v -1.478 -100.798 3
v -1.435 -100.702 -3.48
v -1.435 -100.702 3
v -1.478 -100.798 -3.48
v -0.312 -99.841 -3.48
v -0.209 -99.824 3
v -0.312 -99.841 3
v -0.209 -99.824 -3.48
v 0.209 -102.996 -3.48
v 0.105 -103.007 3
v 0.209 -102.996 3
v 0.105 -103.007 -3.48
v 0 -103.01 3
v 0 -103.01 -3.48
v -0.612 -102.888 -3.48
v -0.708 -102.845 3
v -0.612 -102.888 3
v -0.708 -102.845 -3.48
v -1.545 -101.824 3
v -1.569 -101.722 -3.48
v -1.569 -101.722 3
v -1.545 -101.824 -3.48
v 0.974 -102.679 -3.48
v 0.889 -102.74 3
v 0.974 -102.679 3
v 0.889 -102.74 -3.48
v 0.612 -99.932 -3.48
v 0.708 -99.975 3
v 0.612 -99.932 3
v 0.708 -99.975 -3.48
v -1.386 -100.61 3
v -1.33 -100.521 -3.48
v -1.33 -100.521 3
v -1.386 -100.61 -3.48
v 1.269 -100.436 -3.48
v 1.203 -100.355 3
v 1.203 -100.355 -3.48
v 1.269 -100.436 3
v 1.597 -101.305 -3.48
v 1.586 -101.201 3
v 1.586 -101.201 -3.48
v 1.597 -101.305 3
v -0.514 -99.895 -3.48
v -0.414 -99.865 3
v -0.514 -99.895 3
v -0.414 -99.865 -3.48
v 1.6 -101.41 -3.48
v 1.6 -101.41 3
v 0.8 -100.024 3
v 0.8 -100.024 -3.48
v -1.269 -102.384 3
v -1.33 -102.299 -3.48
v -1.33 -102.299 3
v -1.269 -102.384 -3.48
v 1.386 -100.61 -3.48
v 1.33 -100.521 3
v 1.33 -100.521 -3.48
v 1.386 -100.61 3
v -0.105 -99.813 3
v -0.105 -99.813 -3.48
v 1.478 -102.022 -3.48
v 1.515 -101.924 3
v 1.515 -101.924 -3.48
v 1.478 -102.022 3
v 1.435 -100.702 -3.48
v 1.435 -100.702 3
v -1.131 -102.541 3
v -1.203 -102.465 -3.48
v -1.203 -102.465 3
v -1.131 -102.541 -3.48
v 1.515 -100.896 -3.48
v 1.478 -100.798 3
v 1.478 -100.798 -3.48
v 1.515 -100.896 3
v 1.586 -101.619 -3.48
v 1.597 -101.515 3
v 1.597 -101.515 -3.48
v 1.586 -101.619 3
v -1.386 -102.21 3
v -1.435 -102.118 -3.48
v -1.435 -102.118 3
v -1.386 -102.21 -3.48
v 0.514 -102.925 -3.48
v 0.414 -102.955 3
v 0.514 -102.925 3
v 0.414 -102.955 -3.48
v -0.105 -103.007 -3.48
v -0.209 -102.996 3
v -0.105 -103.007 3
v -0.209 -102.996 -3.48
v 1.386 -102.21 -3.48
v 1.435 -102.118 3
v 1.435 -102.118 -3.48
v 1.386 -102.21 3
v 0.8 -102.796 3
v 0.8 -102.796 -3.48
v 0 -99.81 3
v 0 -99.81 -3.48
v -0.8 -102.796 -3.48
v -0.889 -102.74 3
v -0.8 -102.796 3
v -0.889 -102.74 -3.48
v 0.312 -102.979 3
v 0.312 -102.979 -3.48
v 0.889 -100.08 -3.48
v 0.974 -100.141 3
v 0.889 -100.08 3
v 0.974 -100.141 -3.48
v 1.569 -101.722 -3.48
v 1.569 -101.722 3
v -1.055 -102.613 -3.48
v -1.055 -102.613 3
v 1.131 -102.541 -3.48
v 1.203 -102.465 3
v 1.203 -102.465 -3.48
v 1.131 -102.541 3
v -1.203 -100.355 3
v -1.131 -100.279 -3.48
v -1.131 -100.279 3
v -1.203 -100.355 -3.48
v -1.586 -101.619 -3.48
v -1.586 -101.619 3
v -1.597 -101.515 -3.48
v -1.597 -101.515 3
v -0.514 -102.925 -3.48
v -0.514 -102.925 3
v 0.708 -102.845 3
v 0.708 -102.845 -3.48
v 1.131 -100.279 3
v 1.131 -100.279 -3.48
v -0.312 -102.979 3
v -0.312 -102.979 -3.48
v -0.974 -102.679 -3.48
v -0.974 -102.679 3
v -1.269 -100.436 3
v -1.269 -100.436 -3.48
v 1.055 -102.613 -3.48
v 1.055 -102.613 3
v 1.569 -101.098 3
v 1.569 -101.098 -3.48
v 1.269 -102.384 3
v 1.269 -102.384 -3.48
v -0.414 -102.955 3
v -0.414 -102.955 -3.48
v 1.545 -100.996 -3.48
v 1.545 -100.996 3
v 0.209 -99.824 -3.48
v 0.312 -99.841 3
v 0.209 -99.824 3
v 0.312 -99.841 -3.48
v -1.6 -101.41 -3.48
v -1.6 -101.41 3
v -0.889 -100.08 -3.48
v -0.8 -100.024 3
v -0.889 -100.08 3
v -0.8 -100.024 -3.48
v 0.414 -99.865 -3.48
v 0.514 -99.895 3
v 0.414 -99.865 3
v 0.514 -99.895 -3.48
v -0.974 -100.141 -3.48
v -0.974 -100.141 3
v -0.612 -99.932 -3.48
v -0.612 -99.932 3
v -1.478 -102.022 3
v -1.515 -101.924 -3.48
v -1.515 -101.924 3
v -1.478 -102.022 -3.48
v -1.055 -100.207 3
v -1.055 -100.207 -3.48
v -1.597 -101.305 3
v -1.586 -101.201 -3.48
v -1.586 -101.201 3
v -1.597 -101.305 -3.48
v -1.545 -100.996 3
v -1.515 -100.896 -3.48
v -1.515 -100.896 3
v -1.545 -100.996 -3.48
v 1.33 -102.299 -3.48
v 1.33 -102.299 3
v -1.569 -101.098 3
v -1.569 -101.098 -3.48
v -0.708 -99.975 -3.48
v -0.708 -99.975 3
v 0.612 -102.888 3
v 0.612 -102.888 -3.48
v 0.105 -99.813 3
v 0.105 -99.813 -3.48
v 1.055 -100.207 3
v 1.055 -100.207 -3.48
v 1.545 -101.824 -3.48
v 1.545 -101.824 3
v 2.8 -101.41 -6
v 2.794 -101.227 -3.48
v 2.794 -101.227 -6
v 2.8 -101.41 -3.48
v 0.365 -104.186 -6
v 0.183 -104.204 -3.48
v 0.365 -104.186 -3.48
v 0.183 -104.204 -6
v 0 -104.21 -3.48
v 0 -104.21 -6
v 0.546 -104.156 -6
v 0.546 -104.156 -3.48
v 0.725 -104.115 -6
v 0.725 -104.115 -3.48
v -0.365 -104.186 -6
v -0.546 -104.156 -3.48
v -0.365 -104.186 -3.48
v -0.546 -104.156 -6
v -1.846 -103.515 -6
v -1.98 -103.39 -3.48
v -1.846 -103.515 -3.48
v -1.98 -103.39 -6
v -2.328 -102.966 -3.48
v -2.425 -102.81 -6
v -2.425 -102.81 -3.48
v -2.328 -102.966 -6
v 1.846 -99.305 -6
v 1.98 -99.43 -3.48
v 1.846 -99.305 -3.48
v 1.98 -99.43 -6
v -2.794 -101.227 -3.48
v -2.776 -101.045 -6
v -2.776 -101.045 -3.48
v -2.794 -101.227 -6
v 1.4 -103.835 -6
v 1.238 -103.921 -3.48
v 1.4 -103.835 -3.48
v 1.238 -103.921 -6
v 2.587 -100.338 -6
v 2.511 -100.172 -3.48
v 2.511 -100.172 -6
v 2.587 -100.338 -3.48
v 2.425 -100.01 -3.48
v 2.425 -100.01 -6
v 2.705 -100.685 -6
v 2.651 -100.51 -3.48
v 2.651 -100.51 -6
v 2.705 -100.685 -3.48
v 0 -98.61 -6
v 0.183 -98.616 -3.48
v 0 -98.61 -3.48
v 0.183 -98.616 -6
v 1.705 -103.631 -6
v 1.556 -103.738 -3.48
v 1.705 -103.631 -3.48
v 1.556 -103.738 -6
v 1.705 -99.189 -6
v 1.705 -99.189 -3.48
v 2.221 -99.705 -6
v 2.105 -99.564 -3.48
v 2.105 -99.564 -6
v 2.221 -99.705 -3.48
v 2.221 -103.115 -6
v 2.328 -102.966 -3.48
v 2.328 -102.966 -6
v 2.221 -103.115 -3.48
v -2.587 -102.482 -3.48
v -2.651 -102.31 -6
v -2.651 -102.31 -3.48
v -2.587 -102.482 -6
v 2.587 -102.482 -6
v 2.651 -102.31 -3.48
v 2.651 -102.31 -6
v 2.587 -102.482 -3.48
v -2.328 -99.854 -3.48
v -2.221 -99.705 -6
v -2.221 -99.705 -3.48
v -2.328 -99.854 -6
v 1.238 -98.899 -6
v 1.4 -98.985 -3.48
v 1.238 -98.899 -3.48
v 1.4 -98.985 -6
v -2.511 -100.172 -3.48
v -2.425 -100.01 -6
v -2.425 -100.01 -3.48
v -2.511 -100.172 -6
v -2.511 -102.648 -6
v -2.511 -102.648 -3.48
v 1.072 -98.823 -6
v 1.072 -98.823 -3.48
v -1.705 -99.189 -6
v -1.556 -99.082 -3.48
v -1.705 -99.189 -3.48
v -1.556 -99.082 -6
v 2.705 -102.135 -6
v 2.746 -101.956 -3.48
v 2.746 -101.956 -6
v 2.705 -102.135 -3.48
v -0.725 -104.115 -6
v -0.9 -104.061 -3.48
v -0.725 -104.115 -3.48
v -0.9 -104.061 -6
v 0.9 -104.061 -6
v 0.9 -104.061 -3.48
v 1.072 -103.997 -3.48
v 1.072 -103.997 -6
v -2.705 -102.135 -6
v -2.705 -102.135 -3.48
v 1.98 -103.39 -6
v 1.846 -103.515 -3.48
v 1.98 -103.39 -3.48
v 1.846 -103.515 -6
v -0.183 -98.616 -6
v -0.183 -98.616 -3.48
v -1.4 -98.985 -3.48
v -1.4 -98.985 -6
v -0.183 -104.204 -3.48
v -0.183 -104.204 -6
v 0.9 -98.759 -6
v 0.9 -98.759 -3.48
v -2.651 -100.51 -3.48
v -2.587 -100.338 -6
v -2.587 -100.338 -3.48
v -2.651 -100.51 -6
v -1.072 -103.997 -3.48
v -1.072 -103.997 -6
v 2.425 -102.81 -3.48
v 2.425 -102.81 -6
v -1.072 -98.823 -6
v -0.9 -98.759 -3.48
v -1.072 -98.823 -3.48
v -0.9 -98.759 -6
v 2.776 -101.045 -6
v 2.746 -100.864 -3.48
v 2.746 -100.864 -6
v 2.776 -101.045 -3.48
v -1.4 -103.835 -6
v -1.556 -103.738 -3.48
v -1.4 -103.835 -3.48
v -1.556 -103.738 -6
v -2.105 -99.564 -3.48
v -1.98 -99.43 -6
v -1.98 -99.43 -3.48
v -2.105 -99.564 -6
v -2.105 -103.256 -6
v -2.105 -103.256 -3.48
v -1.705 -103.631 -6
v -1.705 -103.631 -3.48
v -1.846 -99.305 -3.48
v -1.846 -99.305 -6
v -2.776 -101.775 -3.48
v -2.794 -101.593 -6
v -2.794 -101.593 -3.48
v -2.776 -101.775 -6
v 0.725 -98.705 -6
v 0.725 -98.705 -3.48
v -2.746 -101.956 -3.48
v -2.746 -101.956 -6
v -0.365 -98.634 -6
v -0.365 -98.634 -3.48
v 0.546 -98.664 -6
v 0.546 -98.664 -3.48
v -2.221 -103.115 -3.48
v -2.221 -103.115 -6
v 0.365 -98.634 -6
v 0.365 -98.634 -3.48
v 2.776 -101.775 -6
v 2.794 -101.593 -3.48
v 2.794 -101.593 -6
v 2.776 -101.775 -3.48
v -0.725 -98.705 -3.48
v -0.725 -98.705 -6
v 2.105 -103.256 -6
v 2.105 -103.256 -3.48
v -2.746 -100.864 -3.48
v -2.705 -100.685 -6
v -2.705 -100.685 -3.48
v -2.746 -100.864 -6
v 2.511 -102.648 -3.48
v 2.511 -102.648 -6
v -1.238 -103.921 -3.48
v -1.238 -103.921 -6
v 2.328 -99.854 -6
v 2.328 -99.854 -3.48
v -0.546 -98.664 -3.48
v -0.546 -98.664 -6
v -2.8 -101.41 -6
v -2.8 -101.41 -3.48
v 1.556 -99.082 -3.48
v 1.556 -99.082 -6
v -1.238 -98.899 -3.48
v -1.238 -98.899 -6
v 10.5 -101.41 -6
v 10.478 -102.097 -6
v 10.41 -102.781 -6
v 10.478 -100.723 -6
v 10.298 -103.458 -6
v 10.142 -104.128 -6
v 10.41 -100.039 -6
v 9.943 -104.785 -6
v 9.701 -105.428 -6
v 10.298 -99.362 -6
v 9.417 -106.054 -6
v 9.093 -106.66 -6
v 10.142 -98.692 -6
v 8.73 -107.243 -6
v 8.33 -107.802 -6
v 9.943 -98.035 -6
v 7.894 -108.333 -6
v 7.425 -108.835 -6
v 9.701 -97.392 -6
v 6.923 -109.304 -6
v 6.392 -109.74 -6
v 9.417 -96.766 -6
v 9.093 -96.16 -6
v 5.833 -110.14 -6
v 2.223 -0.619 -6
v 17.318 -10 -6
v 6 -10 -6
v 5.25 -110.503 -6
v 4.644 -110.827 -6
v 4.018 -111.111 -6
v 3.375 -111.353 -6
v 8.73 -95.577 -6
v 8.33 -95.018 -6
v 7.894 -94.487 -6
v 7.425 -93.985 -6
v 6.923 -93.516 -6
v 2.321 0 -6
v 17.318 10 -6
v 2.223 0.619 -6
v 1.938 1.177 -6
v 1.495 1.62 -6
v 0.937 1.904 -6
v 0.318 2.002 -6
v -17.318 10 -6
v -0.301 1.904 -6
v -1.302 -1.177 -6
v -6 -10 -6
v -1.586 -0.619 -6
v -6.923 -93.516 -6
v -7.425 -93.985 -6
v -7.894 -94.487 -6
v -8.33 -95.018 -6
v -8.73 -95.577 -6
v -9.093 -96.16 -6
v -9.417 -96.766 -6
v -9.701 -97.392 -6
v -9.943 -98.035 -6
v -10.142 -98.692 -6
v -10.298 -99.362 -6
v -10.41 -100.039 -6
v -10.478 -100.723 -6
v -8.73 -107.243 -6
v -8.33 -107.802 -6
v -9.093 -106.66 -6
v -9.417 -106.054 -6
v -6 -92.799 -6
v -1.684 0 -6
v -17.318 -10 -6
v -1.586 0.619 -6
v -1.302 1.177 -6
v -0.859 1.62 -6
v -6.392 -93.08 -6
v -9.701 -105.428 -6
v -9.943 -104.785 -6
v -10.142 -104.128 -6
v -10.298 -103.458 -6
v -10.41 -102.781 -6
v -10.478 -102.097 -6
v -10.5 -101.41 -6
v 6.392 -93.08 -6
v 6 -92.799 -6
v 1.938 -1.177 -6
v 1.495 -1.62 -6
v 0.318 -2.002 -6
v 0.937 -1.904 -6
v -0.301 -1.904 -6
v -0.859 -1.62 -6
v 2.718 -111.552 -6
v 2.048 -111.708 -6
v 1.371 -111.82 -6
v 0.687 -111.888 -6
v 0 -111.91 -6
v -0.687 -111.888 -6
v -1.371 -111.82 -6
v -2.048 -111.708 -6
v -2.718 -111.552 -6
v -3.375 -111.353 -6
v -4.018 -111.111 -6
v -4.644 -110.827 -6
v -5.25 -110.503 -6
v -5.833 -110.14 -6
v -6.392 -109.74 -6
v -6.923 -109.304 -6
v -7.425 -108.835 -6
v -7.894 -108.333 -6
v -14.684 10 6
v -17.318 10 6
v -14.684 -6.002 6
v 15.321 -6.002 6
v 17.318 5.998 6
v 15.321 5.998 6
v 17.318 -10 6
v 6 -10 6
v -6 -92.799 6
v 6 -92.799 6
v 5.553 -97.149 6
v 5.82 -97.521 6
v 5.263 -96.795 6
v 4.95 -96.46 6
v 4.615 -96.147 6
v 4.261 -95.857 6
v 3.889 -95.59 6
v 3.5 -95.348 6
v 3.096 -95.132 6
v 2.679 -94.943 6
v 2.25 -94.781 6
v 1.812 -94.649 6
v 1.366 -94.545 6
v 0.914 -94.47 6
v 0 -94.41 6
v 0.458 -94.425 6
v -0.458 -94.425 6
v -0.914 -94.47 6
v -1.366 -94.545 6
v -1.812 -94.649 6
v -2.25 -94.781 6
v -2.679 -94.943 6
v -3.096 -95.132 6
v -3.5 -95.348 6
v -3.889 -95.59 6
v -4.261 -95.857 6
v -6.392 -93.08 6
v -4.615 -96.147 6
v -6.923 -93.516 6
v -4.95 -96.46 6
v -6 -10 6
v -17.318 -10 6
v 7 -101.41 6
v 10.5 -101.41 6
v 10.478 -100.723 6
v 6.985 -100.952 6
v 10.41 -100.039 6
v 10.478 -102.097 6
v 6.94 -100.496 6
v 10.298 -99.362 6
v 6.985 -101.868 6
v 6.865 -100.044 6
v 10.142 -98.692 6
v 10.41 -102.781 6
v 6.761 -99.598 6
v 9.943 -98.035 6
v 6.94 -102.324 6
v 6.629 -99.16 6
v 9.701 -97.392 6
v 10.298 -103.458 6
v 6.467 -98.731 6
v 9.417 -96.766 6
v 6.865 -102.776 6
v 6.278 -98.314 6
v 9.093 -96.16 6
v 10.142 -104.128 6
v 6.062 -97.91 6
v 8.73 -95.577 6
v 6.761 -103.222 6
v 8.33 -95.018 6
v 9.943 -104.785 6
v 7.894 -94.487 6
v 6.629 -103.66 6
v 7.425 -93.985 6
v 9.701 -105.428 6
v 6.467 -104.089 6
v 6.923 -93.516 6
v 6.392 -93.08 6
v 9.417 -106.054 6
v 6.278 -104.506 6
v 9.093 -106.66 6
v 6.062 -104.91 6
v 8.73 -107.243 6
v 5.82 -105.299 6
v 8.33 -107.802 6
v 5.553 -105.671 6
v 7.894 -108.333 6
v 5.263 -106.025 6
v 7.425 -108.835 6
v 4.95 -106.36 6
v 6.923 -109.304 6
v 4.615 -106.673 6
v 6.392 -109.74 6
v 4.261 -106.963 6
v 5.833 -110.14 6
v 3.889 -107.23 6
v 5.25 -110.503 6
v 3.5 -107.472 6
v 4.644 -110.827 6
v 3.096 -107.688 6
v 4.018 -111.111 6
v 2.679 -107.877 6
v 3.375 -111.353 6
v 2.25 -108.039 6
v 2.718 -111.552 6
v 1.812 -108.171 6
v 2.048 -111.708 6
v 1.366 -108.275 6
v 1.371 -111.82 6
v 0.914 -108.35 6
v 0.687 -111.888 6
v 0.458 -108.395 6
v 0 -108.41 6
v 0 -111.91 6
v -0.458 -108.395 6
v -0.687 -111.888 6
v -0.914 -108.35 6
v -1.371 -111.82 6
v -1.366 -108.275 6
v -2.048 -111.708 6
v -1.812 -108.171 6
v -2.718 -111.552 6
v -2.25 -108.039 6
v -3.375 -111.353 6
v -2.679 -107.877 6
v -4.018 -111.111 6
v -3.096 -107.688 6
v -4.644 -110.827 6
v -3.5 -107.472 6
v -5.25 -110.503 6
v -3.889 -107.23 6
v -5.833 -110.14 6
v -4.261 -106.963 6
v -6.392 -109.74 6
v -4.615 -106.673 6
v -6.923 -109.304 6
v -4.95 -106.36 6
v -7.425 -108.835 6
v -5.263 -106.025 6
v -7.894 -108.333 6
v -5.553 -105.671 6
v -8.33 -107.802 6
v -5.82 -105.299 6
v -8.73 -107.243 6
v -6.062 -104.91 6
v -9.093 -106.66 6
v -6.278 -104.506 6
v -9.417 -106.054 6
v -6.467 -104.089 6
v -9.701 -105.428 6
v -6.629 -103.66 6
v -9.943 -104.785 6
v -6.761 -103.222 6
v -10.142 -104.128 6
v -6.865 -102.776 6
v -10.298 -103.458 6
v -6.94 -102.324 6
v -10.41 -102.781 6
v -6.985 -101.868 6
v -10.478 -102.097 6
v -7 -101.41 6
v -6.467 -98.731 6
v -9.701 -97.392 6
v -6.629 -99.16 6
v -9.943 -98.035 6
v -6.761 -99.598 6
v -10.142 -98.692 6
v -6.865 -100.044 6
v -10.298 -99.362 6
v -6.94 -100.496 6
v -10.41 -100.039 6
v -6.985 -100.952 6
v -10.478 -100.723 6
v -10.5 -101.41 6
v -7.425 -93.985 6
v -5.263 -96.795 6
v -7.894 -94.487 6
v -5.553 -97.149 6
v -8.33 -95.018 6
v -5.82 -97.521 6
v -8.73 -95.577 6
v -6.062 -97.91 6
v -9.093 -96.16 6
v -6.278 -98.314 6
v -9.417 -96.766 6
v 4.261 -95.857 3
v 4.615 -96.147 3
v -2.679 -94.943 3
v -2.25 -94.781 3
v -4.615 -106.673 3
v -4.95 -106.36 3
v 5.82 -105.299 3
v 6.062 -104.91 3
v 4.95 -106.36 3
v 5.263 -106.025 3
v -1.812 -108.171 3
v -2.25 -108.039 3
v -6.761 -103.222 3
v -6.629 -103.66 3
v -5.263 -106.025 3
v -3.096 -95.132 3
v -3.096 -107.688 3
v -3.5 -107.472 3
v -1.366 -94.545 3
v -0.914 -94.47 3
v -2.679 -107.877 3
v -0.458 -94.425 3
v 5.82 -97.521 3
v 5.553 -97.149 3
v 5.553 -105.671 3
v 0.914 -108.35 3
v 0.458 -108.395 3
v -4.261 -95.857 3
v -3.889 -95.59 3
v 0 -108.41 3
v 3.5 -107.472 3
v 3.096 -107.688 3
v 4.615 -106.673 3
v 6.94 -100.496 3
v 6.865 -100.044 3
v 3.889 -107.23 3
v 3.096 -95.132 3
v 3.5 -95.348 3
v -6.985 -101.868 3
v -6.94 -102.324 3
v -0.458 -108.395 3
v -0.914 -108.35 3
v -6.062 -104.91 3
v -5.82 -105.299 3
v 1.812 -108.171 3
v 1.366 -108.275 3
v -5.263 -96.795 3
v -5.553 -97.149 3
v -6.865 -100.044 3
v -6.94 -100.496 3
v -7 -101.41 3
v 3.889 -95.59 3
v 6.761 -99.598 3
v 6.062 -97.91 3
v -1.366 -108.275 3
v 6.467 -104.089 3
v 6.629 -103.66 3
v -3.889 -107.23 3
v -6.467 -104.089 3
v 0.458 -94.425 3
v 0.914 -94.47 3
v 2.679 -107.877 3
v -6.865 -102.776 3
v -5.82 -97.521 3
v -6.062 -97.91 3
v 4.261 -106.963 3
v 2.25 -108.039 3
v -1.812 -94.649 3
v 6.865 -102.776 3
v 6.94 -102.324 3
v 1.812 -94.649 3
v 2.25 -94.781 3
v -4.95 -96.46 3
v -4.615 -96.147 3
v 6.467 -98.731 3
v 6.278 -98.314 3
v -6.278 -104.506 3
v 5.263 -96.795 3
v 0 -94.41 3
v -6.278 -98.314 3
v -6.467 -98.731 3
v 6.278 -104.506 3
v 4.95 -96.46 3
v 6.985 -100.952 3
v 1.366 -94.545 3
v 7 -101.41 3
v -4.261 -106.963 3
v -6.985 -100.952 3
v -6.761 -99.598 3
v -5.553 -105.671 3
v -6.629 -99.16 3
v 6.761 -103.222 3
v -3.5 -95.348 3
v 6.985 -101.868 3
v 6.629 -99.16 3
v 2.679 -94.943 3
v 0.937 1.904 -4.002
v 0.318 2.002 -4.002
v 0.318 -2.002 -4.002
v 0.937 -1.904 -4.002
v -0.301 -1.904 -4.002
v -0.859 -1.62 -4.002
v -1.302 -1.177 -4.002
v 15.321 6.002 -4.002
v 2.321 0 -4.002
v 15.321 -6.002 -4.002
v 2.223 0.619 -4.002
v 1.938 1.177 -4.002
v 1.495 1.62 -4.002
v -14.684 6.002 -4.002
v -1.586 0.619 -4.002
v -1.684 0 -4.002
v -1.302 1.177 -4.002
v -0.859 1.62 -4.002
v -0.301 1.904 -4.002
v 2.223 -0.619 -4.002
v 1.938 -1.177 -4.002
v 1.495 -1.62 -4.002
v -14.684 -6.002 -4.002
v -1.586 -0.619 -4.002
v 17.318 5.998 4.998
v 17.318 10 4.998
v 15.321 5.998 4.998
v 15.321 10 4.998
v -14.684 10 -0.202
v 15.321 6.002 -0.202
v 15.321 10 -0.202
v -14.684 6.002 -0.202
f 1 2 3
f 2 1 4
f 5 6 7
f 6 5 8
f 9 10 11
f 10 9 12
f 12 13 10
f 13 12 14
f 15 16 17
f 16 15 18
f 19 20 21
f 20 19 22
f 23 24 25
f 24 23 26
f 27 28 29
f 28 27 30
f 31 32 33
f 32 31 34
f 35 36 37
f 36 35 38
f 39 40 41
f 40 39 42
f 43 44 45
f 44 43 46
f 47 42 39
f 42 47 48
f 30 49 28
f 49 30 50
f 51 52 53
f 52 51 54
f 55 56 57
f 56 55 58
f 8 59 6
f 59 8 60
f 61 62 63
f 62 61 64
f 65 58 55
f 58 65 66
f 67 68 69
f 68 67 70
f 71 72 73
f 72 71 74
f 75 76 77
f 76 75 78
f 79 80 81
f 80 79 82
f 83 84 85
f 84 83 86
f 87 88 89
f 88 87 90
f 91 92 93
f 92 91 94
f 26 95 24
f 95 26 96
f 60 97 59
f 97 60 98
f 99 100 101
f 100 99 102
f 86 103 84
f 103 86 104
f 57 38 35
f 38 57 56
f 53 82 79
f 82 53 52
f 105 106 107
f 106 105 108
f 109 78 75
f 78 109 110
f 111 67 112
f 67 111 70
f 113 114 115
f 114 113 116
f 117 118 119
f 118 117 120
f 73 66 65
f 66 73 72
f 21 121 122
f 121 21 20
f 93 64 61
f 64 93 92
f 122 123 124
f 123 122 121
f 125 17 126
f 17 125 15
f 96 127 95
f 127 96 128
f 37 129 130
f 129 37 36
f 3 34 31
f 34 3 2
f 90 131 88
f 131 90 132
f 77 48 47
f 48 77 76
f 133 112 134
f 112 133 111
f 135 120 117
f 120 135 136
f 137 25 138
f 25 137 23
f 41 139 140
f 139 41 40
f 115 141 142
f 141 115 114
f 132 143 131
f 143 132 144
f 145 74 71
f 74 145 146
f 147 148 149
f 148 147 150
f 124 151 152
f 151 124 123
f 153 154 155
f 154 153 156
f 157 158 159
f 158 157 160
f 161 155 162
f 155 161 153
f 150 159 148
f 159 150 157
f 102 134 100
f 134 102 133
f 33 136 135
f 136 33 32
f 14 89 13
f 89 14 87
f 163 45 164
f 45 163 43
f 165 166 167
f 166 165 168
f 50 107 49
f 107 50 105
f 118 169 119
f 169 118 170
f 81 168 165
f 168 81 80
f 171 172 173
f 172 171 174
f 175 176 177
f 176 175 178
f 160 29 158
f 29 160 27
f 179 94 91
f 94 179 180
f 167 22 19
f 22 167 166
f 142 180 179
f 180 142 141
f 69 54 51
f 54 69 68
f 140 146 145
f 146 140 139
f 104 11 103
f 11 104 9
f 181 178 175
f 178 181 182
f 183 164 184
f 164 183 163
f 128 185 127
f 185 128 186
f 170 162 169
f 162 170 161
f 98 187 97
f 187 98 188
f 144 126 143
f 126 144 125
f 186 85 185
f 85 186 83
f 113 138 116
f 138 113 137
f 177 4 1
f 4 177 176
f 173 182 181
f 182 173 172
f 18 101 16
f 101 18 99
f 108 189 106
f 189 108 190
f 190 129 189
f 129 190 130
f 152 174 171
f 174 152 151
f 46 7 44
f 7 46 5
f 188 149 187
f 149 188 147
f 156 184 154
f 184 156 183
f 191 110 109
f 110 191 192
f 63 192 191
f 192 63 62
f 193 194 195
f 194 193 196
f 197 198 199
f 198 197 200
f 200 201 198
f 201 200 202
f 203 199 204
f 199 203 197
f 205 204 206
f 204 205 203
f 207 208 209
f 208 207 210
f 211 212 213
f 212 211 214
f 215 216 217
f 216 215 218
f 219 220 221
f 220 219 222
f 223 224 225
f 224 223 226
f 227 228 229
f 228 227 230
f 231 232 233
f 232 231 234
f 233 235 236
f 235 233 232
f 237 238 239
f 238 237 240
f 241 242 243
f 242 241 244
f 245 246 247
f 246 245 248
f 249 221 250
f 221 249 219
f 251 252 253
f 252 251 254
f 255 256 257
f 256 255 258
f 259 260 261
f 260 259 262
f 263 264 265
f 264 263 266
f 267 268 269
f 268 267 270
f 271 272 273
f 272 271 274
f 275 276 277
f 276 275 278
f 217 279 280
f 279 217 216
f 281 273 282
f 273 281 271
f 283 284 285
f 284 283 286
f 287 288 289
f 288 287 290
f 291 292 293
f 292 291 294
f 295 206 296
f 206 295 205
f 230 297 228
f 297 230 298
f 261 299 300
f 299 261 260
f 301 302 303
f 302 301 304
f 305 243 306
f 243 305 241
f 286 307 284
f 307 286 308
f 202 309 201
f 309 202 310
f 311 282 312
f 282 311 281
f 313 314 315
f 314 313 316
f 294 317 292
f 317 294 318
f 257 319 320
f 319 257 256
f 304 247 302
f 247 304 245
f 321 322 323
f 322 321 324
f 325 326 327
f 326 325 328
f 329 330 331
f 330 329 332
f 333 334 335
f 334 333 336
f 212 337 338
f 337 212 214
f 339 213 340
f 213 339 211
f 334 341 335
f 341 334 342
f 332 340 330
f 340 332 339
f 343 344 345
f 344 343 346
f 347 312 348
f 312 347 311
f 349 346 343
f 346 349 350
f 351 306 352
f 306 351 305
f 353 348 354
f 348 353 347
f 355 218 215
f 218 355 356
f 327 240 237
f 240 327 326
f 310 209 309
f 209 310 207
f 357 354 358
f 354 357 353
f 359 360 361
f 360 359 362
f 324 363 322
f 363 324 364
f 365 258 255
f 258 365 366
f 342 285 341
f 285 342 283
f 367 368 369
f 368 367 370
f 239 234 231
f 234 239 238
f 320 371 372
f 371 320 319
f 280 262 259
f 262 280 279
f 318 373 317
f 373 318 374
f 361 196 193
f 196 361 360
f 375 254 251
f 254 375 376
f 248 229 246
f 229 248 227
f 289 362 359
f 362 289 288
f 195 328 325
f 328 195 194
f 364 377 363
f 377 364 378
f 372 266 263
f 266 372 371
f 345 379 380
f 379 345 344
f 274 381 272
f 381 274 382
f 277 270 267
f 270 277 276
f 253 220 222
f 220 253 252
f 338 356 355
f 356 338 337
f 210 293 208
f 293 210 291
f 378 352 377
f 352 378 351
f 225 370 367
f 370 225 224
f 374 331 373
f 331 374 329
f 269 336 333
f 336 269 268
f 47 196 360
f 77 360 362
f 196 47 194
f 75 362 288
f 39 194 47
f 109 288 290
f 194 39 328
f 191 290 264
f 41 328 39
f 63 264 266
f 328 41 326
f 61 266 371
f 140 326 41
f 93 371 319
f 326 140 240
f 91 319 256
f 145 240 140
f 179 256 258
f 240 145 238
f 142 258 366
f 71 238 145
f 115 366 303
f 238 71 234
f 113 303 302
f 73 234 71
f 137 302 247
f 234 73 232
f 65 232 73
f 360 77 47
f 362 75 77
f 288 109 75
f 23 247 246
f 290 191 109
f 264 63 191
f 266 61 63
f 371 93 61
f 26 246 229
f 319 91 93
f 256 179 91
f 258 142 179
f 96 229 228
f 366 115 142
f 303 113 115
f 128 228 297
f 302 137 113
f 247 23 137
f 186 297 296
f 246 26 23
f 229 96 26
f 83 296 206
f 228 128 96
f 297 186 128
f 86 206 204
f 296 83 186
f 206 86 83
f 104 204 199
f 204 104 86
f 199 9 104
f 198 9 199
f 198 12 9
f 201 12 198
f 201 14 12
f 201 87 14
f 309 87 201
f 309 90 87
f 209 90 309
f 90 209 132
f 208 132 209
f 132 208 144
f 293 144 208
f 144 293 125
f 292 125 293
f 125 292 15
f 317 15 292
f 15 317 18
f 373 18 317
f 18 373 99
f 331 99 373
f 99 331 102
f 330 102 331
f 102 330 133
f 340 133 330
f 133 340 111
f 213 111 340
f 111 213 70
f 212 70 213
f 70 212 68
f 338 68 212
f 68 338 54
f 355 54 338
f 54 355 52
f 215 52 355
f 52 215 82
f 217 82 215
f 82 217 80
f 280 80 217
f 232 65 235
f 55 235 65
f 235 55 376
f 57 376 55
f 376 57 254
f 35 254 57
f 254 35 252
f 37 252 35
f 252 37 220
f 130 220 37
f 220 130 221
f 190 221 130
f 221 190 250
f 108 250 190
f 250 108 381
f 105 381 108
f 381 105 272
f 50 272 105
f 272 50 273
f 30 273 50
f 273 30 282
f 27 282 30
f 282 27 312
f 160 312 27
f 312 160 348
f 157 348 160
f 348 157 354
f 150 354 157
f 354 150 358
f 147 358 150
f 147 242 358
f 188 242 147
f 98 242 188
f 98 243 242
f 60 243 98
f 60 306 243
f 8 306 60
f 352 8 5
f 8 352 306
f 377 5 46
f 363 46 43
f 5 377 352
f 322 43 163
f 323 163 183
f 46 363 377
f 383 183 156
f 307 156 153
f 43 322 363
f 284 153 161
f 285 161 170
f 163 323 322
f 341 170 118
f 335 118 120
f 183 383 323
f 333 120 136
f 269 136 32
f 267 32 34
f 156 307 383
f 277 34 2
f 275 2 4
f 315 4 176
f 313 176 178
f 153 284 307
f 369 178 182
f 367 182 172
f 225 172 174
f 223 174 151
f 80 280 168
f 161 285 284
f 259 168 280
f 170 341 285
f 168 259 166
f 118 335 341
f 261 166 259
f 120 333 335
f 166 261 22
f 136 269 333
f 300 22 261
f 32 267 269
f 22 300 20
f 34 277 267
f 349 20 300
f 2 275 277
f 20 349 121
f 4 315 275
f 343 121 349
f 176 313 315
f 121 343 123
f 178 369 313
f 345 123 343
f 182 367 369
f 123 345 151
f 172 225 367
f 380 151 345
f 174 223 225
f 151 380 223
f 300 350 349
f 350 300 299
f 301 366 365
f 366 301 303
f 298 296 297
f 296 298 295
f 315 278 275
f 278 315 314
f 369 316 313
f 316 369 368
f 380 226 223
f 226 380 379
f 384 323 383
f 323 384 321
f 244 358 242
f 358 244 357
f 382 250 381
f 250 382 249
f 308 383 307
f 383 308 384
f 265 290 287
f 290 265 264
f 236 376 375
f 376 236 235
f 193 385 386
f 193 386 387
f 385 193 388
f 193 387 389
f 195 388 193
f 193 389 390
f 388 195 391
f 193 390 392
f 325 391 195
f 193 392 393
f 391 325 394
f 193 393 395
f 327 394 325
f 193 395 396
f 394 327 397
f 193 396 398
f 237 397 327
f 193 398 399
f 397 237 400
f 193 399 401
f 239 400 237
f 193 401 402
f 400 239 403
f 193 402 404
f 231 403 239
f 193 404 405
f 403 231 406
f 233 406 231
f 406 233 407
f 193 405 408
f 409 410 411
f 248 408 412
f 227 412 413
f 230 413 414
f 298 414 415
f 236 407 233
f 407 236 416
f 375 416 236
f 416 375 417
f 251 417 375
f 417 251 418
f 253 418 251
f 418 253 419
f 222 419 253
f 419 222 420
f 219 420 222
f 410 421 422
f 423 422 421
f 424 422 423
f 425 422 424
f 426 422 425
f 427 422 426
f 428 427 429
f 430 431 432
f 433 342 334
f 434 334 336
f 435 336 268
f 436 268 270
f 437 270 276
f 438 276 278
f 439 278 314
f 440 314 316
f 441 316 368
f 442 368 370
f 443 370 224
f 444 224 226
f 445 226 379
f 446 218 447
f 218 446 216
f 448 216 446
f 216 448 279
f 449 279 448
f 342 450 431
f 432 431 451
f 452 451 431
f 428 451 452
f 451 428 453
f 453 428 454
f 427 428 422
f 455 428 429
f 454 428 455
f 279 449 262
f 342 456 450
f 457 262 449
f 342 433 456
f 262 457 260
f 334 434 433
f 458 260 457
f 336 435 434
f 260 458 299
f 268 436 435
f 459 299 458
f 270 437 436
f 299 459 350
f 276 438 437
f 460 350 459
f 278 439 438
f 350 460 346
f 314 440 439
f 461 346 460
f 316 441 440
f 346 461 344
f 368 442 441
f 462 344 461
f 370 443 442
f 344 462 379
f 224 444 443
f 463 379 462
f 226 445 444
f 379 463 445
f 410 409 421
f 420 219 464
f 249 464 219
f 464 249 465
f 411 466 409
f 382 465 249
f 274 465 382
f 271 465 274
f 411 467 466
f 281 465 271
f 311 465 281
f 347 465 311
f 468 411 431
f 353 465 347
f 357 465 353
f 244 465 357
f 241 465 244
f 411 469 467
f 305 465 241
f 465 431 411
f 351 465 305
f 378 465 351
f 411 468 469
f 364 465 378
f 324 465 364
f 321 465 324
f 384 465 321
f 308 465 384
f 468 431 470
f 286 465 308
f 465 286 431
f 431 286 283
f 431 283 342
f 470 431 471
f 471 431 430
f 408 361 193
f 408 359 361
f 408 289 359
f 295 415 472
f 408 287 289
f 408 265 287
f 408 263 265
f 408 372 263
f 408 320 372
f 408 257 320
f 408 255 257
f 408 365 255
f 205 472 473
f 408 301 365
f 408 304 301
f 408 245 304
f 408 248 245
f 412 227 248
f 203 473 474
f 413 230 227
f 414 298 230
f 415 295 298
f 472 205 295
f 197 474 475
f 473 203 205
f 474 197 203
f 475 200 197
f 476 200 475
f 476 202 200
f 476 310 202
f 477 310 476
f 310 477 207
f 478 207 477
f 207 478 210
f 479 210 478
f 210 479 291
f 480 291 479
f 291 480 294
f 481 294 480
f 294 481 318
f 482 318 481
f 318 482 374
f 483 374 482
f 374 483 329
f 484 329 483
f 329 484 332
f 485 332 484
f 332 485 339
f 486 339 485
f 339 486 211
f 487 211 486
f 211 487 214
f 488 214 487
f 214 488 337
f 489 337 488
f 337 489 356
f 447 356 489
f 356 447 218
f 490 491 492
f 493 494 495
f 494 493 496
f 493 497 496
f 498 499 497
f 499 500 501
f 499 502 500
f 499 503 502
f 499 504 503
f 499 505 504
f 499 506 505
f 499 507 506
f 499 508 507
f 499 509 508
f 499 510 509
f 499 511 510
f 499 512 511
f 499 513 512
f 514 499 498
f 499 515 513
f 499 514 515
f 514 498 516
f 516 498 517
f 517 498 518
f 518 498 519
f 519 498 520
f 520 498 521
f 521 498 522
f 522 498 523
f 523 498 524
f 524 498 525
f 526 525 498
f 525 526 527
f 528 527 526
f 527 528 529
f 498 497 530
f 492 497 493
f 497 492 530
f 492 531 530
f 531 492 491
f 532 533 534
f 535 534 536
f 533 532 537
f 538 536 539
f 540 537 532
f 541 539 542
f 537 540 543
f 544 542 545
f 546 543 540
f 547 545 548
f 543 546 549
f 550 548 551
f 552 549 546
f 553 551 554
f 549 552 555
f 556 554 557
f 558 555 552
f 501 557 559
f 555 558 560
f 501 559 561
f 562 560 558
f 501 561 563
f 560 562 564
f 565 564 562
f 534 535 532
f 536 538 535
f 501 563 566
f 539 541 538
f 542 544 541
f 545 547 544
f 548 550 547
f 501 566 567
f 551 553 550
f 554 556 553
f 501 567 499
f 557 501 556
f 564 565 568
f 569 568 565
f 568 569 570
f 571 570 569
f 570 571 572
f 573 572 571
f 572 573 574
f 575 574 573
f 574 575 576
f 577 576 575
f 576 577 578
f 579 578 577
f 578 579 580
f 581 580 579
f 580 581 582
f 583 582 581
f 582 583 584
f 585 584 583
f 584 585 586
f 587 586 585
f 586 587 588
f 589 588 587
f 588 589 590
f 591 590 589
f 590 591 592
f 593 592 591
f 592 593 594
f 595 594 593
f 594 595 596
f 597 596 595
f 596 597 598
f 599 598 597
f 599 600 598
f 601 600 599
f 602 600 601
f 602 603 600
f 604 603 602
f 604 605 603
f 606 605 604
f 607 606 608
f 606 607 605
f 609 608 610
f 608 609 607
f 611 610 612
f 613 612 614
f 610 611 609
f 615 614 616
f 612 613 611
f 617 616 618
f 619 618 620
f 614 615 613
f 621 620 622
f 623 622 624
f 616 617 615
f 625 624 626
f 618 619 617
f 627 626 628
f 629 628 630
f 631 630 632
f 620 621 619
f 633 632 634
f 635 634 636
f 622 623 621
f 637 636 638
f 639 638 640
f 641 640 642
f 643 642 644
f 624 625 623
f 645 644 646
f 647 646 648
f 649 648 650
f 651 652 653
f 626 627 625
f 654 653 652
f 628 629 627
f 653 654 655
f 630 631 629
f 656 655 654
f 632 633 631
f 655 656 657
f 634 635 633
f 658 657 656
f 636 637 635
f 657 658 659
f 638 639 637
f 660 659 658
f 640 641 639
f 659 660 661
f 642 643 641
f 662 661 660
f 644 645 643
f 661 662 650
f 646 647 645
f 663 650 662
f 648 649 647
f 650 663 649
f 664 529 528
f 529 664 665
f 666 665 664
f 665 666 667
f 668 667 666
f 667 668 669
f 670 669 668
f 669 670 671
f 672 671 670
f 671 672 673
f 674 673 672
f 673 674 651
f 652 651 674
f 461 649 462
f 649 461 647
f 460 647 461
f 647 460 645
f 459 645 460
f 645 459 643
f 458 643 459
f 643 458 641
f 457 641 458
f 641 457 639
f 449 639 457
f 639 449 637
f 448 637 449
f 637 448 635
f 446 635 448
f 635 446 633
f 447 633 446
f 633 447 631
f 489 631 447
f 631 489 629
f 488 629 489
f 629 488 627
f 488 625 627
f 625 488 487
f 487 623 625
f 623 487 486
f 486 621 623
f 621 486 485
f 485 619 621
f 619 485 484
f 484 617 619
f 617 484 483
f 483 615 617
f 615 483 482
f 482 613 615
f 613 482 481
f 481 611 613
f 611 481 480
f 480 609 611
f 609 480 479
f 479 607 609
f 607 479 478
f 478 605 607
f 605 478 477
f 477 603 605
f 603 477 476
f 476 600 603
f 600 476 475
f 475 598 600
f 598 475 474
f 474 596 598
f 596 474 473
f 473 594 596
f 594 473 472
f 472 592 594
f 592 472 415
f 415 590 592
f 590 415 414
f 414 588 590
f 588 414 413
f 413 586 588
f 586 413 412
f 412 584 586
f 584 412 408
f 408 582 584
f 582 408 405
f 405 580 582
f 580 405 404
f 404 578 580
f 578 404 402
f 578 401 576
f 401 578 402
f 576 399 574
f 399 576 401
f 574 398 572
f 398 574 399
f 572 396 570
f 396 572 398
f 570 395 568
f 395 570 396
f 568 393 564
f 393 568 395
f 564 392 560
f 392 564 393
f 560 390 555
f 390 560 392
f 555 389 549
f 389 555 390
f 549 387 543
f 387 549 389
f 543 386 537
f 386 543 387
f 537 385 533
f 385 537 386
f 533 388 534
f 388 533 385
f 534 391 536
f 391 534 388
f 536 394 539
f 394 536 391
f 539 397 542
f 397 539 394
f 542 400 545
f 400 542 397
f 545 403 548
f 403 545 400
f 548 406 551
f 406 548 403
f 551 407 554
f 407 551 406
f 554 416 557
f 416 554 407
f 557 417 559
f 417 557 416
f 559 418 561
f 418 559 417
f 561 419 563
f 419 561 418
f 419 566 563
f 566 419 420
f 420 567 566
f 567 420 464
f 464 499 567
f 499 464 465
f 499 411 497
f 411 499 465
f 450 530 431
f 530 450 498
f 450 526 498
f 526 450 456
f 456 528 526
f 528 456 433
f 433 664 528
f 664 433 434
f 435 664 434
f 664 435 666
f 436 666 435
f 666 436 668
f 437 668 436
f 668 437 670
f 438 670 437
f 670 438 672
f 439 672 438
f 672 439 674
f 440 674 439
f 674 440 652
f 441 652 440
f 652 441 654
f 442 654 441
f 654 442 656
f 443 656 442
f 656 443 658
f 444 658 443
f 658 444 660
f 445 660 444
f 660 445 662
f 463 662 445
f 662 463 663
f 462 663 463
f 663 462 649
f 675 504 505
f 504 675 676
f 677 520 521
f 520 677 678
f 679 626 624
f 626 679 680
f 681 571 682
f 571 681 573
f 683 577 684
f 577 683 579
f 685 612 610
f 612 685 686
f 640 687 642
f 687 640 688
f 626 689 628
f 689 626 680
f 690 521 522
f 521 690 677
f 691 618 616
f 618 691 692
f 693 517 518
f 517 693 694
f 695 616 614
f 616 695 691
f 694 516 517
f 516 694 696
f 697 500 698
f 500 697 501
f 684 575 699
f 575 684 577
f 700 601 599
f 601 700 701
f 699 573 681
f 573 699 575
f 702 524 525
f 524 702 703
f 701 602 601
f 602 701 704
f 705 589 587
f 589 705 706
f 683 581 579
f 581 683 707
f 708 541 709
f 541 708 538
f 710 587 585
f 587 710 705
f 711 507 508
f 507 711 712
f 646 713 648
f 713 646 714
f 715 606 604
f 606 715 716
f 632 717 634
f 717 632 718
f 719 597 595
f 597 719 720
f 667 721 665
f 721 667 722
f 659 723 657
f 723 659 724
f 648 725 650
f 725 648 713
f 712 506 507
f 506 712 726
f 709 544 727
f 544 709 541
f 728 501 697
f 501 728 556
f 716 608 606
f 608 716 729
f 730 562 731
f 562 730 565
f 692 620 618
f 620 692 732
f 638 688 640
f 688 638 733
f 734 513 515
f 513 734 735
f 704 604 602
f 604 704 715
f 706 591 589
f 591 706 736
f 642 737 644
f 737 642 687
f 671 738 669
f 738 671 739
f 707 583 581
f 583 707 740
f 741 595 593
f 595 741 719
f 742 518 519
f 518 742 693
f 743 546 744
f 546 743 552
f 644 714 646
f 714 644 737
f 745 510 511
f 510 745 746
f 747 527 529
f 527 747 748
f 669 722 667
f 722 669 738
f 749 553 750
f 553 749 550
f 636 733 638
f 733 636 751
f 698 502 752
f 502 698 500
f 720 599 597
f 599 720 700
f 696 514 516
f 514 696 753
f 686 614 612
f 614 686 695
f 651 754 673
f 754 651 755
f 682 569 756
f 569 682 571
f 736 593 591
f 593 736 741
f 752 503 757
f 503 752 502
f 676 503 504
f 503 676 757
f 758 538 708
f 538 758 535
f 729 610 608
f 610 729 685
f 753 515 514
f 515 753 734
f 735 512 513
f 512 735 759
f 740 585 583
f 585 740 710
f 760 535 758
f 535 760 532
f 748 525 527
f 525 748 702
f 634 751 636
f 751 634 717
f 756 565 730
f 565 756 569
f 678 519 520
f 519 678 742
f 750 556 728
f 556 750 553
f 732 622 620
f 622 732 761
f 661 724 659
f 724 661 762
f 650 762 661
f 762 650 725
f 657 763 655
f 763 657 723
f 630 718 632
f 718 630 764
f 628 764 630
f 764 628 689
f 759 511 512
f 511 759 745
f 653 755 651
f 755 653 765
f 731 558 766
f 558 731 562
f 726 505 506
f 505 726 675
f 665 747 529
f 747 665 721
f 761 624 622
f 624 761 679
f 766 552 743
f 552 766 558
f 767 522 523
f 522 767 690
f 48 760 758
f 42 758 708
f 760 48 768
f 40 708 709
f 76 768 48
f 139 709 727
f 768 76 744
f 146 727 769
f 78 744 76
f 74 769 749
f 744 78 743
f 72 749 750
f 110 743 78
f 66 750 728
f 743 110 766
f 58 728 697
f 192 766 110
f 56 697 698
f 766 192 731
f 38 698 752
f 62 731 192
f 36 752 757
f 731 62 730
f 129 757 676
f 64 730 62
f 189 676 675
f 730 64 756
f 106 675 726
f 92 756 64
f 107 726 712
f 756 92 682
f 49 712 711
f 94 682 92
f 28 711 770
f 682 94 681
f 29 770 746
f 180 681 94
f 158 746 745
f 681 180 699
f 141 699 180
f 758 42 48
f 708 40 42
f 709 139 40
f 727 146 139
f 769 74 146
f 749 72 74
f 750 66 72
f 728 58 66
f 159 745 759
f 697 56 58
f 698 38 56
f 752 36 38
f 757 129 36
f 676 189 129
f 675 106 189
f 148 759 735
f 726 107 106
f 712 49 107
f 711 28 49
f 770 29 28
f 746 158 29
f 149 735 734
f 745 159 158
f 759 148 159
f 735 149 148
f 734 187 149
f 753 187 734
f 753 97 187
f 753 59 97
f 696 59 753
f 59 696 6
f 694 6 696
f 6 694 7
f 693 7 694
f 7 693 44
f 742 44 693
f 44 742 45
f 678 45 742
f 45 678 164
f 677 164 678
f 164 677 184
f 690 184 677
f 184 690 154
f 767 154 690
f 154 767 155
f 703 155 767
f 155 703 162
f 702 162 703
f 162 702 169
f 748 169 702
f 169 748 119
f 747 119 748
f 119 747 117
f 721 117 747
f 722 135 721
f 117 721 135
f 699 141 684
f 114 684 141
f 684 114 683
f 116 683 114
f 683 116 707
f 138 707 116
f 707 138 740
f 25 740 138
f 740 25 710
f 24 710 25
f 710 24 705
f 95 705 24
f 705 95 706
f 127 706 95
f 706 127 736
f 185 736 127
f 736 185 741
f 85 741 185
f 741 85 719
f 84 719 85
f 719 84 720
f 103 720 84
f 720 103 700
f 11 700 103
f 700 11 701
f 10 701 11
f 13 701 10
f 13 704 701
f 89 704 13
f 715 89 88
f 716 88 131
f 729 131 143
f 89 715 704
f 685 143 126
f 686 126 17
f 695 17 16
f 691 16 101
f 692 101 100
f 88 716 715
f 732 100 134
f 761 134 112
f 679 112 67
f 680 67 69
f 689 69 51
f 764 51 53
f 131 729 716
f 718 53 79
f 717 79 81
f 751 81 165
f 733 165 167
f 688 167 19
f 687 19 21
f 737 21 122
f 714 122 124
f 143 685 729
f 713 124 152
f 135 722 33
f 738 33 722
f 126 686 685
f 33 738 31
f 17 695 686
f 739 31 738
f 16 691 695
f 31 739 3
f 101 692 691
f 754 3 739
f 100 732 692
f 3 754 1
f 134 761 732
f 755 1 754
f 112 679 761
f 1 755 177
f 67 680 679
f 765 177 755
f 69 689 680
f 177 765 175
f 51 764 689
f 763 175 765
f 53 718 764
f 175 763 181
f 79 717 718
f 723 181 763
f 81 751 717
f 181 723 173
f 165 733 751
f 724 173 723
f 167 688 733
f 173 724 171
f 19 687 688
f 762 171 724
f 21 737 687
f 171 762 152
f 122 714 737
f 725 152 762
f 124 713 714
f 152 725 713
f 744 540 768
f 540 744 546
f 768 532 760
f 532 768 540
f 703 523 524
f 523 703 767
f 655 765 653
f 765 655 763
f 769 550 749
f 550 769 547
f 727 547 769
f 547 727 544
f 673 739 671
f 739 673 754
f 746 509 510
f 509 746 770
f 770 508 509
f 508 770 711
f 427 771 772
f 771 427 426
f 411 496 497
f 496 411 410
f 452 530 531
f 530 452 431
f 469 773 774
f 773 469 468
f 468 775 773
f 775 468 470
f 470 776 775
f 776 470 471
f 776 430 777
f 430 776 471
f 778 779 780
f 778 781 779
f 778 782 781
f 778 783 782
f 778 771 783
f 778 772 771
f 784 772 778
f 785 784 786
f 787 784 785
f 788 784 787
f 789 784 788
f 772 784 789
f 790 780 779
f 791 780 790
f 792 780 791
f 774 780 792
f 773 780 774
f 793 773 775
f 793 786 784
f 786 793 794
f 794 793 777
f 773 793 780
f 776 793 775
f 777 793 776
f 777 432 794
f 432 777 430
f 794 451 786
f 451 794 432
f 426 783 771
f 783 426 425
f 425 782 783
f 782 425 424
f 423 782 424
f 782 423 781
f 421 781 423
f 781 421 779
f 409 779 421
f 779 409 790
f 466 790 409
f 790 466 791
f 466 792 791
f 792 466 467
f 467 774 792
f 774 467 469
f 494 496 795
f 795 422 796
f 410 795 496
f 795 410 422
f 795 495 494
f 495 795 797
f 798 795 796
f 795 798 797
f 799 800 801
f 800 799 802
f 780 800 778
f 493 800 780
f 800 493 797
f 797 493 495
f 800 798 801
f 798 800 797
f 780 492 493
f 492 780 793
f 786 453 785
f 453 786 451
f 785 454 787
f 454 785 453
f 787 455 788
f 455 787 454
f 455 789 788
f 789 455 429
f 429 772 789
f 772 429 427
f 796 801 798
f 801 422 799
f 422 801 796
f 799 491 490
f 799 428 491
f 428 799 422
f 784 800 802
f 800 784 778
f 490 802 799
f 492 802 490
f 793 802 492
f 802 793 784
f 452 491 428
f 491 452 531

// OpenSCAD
// file: hotbed_foot_arm_v2.scad
// Parametric arm for the hotbed foot/camera mount.
// v2 defaults match the requested "new default" OpenSCAD parameter set.
// Self-contained OpenSCAD model; does not import or reference STL files.

/* [Arm body] */
// Overall arm length from the square end to the far side of the round end.
arm_length = 103.91; // [30:0.1:180]
// Straight arm width.
arm_width = 12.00; // [6:0.1:60]
// Arm thickness/height. Default matches the hotbed foot height.
arm_height = 12.00; // [2:0.1:30]

/* [Round end] */
// Diameter of the round section at the end of the arm.
end_circle_diameter = 21.00; // [10:0.1:80]
// Segment count for the round end and screw hole.
round_detail = 96; // [32, 48, 64, 96, 128]

/* [Raised / lowered circle pad] */
// Raised adds material above the round end; Lowered cuts a circular recess; Flush disables the feature.
pad_style = "Lowered"; // [Raised, Lowered, Flush]
// Diameter of the raised/lowered circular pad area.
pad_diameter = 14.00; // [6:0.1:70]
// Height of raised pad or depth of lowered recess.
pad_height = 3.00; // [0.2:0.1:12]

/* [M3 screw hole] */
// M3 clearance hole diameter.
m3_hole_diameter = 3.20; // [2.8:0.05:4.0]
// Optional counterbore diameter. Set style to None to disable.
counterbore_style = "Lowered side"; // [None, Raised side, Lowered side]
// Counterbore diameter for screw head clearance.
counterbore_diameter = 5.60; // [4:0.1:12]
// Counterbore depth.
counterbore_depth = 2.50; // [0.5:0.1:8]

/* [Placement] */
// Centered places the arm around the origin; Positive X starts the square end at X=0.
model_position = "Centered"; // [Centered, Positive X]

module rounded_arm_2d(length, width, end_diameter) {
  circle_center_x = length / 2 - end_diameter / 2;

  union() {
    translate([-length / 2, -width / 2])
      square([max(circle_center_x + length / 2, 0.01), width]);

    translate([circle_center_x, 0])
      circle(d = end_diameter, $fn = round_detail);
  }
}

module arm_base(length, width, height, end_diameter) {
  linear_extrude(height = height)
    rounded_arm_2d(length, width, end_diameter);
}

module circle_pad(length, height, end_diameter, diameter, style, feature_height) {
  circle_center_x = length / 2 - end_diameter / 2;

  if (style == "Raised") {
    translate([circle_center_x, 0, height])
      cylinder(h = feature_height, d = diameter, $fn = round_detail);
  }
}

module pad_recess_cut(length, height, end_diameter, diameter, style, feature_height) {
  circle_center_x = length / 2 - end_diameter / 2;

  if (style == "Lowered") {
    translate([circle_center_x, 0, height - feature_height])
      cylinder(h = feature_height + 0.02, d = diameter, $fn = round_detail);
  }
}

module screw_cuts(length, height, end_diameter) {
  circle_center_x = length / 2 - end_diameter / 2;
  total_cut_height = height + (pad_style == "Raised" ? pad_height : 0) + 0.04;

  translate([circle_center_x, 0, -0.02])
    cylinder(h = total_cut_height, d = m3_hole_diameter, $fn = round_detail);

  if (counterbore_style == "Raised side") {
    translate([circle_center_x, 0, height + (pad_style == "Raised" ? pad_height : 0) - counterbore_depth])
      cylinder(h = counterbore_depth + 0.04, d = counterbore_diameter, $fn = round_detail);
  }

  if (counterbore_style == "Lowered side") {
    translate([circle_center_x, 0, -0.02])
      cylinder(h = counterbore_depth + 0.04, d = counterbore_diameter, $fn = round_detail);
  }
}

module hotbed_foot_arm_v2(
  length = arm_length,
  width = arm_width,
  height = arm_height,
  end_diameter = end_circle_diameter,
  position = model_position
) {
  placement = position == "Positive X" ? [length / 2, 0, 0] : [0, 0, 0];

  translate(placement)
    difference() {
      union() {
        arm_base(length, width, height, end_diameter);
        circle_pad(length, height, end_diameter, pad_diameter, pad_style, pad_height);
      }

      pad_recess_cut(length, height, end_diameter, pad_diameter, pad_style, pad_height);
      screw_cuts(length, height, end_diameter);
    }
}

hotbed_foot_arm_v2();
// main file
// Combined hotbed foot + single selectable arm attachment.
// Foot uses hotbed_foot_v6.scad; arm uses hotbed_foot_arm_v2.scad.
// Notch/front side of the foot is +Y. Arms attach on the opposite side and extend toward -Y.

use <hotbed_foot_v6.scad>
use <hotbed_foot_arm_v2.scad>

/* [Assembly] */
// Select exactly one arm attachment location.
arm_attach_location = "Center"; // [Left, Center, Right]
// Show colored preview matching the reference sketch.
preview_colors = "Enabled"; // [Enabled, Disabled]

/* [Foot settings] */
// Foot placement is centered by default for easier assembly alignment.
foot_position = "Centered"; // [Centered, Source STL]
// Keep original notch side or mirror the foot/notch.
foot_notch_side = "Original Left"; // [Original Left, Mirrored Right]

/* [Arm settings] */
// Arm length from attachment edge to far side of round end.
arm_length = 103.91; // [30:0.1:180]
// Arm width.
arm_width = 12.00; // [6:0.1:60]
// Arm height/thickness.
arm_height = 12.00; // [2:0.1:30]
// Round end diameter.
arm_end_circle_diameter = 21.00; // [10:0.1:80]
// How far the arm overlaps into the foot for a fused printable joint.
arm_attach_overlap = 2.00; // [0:0.1:10]

/* [Attachment geometry] */
// Left and right arm angles measured in degrees from +X before the arm is rotated into place.
side_arm_angle = 45; // [15:1:75]
// X position of the side attachments from center. Default lands near the foot corners.
side_attach_x = 15.30; // [4:0.1:25]
foot_length = 34.63543701;
foot_width = 20.00;
foot_height = 12.00;

module maybe_color(name) {
  if (preview_colors == "Enabled") {
    color(name) children();
  } else {
    children();
  }
}

module placed_arm(location) {
  z_base = -foot_height / 2;
  attach_y = -foot_width / 2 + arm_attach_overlap;

  if (location == "Center") {
    translate([0, attach_y, z_base])
      rotate([0, 0, -90])
        hotbed_foot_arm_v2(
          length = arm_length,
          width = arm_width,
          height = arm_height,
          end_diameter = arm_end_circle_diameter,
          position = "Positive X"
        );
  }

  if (location == "Left") {
    translate([-side_attach_x, attach_y, z_base])
      rotate([0, 0, -90 - side_arm_angle])
        hotbed_foot_arm_v2(
          length = arm_length,
          width = arm_width,
          height = arm_height,
          end_diameter = arm_end_circle_diameter,
          position = "Positive X"
        );
  }

  if (location == "Right") {
    translate([side_attach_x, attach_y, z_base])
      rotate([0, 0, -90 + side_arm_angle])
        hotbed_foot_arm_v2(
          length = arm_length,
          width = arm_width,
          height = arm_height,
          end_diameter = arm_end_circle_diameter,
          position = "Positive X"
        );
  }
}

module hotbed_foot_with_arm_v1(
  location = arm_attach_location
) {
  union() {
    maybe_color("gold")
      hotbed_foot_v6(position = foot_position, notch_side = foot_notch_side);

    maybe_color("blue")
      placed_arm(location);
  }
}

hotbed_foot_with_arm_v1();
